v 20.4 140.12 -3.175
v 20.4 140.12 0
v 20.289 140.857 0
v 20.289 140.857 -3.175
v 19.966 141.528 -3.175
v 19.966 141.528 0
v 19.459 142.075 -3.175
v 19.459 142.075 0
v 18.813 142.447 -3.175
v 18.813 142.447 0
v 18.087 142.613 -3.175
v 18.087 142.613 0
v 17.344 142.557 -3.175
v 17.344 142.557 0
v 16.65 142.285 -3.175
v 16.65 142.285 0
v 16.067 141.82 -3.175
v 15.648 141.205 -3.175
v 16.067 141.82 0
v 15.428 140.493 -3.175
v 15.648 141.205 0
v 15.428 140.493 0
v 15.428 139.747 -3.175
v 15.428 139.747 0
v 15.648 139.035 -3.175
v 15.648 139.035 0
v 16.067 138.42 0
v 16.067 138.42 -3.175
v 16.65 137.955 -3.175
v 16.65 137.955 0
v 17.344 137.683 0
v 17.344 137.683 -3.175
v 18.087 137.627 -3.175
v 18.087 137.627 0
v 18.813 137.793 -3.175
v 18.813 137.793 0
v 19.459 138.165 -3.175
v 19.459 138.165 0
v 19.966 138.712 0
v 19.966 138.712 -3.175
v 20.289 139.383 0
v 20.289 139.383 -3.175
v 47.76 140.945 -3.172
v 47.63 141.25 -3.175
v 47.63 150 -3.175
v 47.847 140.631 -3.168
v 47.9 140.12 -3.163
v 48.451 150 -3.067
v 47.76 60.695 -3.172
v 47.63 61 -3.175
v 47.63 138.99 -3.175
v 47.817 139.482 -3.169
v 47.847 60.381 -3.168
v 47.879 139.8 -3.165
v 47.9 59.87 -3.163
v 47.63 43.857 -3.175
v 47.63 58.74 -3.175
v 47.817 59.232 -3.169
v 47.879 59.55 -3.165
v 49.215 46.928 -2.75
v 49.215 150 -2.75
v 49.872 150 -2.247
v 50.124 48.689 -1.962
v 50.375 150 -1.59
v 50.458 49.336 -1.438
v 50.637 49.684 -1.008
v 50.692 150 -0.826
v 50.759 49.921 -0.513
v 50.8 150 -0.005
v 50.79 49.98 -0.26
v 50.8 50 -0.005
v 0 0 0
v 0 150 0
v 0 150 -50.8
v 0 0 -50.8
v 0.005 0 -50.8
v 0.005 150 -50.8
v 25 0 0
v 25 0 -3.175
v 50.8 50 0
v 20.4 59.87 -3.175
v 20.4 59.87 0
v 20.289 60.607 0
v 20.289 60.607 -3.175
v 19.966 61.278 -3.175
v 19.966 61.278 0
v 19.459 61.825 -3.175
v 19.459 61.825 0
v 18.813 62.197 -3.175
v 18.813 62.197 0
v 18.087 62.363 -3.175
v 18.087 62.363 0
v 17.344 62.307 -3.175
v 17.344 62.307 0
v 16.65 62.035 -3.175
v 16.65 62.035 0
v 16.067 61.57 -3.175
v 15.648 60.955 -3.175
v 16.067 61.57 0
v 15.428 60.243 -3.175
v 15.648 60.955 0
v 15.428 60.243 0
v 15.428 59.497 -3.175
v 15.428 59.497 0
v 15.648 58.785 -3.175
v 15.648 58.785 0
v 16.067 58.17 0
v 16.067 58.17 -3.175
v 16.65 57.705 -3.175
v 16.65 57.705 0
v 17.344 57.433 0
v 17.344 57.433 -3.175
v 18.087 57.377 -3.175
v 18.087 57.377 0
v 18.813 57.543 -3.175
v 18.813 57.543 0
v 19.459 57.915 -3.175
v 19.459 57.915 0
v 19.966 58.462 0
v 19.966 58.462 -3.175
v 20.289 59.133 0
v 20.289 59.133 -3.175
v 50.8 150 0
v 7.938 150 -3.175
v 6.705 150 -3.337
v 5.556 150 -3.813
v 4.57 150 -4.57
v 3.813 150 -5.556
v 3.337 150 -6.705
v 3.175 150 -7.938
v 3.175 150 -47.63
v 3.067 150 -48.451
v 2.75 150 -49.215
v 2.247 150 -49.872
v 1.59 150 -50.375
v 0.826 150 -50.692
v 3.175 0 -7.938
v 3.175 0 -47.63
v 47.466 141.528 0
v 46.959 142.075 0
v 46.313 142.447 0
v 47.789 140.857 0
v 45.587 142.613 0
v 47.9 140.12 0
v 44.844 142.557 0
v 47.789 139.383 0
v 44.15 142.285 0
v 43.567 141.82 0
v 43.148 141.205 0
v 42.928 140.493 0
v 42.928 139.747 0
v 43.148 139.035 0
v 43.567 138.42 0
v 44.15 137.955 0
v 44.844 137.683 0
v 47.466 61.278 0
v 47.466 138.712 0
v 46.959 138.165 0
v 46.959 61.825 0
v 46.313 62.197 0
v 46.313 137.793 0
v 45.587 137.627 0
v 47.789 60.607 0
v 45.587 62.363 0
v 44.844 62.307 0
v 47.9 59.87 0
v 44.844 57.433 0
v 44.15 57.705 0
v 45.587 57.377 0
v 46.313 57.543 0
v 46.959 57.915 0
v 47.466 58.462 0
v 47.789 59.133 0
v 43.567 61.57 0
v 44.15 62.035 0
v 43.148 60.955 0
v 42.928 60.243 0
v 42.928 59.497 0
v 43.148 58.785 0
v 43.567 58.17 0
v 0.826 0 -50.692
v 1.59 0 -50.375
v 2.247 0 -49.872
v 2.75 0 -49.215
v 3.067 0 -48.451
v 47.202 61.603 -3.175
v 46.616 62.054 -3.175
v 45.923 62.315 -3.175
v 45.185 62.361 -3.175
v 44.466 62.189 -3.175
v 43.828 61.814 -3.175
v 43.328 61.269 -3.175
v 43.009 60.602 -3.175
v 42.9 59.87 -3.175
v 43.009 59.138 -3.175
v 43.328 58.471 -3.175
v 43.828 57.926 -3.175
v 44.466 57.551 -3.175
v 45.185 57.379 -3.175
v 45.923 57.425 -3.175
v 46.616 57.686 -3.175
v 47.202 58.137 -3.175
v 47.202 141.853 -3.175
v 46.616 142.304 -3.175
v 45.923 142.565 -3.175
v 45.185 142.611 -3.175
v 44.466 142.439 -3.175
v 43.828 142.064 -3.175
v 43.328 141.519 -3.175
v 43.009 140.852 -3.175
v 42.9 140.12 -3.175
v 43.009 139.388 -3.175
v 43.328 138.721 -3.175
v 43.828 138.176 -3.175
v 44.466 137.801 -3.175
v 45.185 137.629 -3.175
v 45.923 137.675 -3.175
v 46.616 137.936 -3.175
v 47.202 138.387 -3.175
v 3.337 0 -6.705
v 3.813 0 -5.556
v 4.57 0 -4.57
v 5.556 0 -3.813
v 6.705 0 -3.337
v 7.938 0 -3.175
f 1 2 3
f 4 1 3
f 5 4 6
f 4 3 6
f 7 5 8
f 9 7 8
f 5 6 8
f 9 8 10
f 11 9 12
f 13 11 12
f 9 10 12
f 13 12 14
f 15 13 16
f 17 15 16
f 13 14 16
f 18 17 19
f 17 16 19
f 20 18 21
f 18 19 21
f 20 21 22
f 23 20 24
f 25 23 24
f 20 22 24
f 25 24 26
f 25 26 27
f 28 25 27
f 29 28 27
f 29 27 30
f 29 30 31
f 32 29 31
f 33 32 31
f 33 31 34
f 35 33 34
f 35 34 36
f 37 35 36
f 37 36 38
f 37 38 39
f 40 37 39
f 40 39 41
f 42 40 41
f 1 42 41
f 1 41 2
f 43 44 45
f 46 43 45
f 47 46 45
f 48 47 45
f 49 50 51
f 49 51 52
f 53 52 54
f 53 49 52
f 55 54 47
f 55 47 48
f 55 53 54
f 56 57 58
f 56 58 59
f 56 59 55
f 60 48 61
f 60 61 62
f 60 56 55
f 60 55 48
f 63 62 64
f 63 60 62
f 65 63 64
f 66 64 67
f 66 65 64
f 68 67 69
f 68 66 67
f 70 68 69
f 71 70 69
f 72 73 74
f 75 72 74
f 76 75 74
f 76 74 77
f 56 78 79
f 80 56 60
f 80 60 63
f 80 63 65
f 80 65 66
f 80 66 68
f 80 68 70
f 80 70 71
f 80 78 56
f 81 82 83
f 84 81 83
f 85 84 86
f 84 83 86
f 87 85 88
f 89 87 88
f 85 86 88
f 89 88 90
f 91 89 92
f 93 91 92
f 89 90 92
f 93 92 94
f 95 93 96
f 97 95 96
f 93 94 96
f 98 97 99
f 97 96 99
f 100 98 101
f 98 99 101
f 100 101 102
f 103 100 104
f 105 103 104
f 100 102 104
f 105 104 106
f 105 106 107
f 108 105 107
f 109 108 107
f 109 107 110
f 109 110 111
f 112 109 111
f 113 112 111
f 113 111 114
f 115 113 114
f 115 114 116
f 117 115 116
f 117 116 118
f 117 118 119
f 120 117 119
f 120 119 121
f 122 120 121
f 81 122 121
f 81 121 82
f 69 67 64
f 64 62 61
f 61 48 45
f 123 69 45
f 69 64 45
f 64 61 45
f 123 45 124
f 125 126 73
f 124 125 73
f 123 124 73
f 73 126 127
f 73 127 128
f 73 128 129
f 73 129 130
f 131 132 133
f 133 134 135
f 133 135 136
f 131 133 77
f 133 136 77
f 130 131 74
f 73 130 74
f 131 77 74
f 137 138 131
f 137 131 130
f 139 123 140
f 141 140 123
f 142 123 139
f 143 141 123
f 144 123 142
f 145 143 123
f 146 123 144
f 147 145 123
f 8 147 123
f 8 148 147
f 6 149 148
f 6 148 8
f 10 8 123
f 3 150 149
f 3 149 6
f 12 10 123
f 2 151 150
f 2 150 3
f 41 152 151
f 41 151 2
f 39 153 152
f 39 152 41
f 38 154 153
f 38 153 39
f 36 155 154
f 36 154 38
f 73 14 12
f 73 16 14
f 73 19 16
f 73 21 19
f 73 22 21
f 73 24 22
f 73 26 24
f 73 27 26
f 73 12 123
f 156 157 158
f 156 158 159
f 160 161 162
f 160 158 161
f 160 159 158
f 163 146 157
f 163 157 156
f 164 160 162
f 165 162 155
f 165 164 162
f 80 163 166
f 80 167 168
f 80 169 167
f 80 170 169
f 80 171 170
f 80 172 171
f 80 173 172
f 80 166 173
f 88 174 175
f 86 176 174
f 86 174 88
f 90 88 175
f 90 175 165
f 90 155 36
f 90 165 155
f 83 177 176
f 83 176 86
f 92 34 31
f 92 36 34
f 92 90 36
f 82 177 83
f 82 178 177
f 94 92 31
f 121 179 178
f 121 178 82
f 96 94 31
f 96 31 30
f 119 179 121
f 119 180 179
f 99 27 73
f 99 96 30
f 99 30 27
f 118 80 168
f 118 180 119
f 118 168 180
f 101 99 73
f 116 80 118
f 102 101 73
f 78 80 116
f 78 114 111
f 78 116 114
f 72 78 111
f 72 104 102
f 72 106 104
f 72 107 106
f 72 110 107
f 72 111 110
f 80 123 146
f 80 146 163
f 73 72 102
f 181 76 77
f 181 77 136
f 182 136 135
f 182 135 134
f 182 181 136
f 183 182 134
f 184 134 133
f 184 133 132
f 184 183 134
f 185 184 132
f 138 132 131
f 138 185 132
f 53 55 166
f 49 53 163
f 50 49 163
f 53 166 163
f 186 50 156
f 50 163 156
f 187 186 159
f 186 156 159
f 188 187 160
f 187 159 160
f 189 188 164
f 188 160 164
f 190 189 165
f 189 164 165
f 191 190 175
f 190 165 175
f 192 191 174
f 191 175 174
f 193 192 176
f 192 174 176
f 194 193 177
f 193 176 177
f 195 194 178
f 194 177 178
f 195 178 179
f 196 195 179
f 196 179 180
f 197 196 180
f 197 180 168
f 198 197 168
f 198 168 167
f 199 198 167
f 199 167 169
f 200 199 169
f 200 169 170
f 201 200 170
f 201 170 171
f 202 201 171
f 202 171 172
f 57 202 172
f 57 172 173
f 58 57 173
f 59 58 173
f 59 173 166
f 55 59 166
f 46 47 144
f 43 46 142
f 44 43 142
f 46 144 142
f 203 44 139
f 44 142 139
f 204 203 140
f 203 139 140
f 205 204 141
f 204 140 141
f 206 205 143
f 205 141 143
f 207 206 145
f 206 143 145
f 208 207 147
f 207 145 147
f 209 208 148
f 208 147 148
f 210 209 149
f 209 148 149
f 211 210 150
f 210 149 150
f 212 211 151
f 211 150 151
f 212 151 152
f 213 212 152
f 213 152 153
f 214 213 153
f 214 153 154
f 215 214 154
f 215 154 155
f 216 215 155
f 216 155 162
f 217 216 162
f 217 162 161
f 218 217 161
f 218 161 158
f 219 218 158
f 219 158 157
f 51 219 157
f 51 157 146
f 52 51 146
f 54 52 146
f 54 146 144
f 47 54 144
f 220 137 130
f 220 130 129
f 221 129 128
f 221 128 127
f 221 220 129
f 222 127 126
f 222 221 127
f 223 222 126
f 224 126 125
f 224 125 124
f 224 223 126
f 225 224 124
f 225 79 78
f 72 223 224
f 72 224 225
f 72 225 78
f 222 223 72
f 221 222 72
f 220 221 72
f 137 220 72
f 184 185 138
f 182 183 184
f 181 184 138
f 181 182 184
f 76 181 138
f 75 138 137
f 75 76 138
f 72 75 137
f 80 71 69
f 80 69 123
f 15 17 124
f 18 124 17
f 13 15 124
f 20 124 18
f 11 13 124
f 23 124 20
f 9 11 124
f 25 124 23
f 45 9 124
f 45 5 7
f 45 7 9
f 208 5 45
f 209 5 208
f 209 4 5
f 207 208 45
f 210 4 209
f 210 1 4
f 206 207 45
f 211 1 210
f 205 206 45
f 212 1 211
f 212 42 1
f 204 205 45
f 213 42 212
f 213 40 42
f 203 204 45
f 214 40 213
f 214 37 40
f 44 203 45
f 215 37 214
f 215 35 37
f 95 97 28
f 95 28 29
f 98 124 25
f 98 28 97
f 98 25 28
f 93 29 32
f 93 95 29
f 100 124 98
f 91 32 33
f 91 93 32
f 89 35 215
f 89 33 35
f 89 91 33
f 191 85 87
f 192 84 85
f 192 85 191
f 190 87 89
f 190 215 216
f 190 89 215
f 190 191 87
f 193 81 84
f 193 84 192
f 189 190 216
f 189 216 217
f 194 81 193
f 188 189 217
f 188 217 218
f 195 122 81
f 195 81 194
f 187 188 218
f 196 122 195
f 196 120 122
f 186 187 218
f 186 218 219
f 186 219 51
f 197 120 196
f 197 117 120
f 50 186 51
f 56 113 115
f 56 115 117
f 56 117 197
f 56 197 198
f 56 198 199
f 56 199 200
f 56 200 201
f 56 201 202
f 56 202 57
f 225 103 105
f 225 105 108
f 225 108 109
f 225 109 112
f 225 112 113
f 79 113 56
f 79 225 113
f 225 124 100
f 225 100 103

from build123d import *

# Parameters (mm, degrees)
HIERRO_ANGULAR_2_X_2_X_0_125_1_DEPTH = 150
CORTAR_EXTRUIR1_DEPTH                = 10
CORTAR_EXTRUIR2_REACH                = 168.317
CROQUIS4_R                           = 2.5


with BuildPart() as part:
    # Sketch1 → Hierro angular 2 X 2 X 0.125(1) (new body)
    with BuildSketch(Plane(origin=(0, 0, 0), x_dir=(1, 0, 0), z_dir=(0, 1, 0))):
        with BuildLine():
            Line((0, 0), (0, 50.8))
            Line((0, 50.8), (0.00508, 50.8))
            ThreePointArc((0.00508, 50.8), (2.246551928, 49.871551928), (3.175, 47.63008))
            Line((3.175, 47.63008), (3.175, 7.9375))
            ThreePointArc((3.175, 7.9375), (4.569903955, 4.569903955), (7.9375, 3.175))
            Line((7.9375, 3.175), (47.63008, 3.175))
            ThreePointArc((47.63008, 3.175), (49.871551928, 2.246551928), (50.8, 0.00508))
            Line((50.8, 0.00508), (50.8, 0))
            Line((50.8, 0), (0, 0))
        make_face()
    extrude(amount=HIERRO_ANGULAR_2_X_2_X_0_125_1_DEPTH)

    # Croquis3 → Cortar-Extruir1 (cut)
    with BuildSketch(Plane.XY):
        Polygon((25, 0), (50.8, 50), (50.8, 0), align=None)
    extrude(amount=-CORTAR_EXTRUIR1_DEPTH, mode=Mode.SUBTRACT)

    # Cortar-Extruir2: up to this face of the body (flat: up to its plane)
    cortar_extruir2_end = Plane(part.part.faces().sort_by_distance((26.665136317, 80.490198143, -3.175))[0])
    # Croquis4 → Cortar-Extruir2 (cut, up to the picked face)
    with BuildSketch(Plane.XY, mode=Mode.PRIVATE) as cortar_extruir2_sk1:
        with Locations((17.9, 140.12)):
            Circle(CROQUIS4_R)
    cortar_extruir2_tool1 = split(extrude(cortar_extruir2_sk1.sketch, amount=-CORTAR_EXTRUIR2_REACH, mode=Mode.PRIVATE), bisect_by=cortar_extruir2_end, keep=Keep.BOTH, mode=Mode.PRIVATE)
    # Croquis4 → Cortar-Extruir2 (cut, up to the picked face)
    with BuildSketch(Plane.XY, mode=Mode.PRIVATE) as cortar_extruir2_sk2:
        with Locations((45.4, 140.12)):
            Circle(CROQUIS4_R)
    cortar_extruir2_tool2 = split(extrude(cortar_extruir2_sk2.sketch, amount=-CORTAR_EXTRUIR2_REACH, mode=Mode.PRIVATE), bisect_by=cortar_extruir2_end, keep=Keep.BOTH, mode=Mode.PRIVATE)
    # Croquis4 → Cortar-Extruir2 (cut, up to the picked face)
    with BuildSketch(Plane.XY, mode=Mode.PRIVATE) as cortar_extruir2_sk3:
        with Locations((17.9, 59.87)):
            Circle(CROQUIS4_R)
    cortar_extruir2_tool3 = split(extrude(cortar_extruir2_sk3.sketch, amount=-CORTAR_EXTRUIR2_REACH, mode=Mode.PRIVATE), bisect_by=cortar_extruir2_end, keep=Keep.BOTH, mode=Mode.PRIVATE)
    # Croquis4 → Cortar-Extruir2 (cut, up to the picked face)
    with BuildSketch(Plane.XY, mode=Mode.PRIVATE) as cortar_extruir2_sk4:
        with Locations((45.4, 59.87)):
            Circle(CROQUIS4_R)
    cortar_extruir2_tool4 = split(extrude(cortar_extruir2_sk4.sketch, amount=-CORTAR_EXTRUIR2_REACH, mode=Mode.PRIVATE), bisect_by=cortar_extruir2_end, keep=Keep.BOTH, mode=Mode.PRIVATE)
    add(cortar_extruir2_tool1.solids().sort_by(Axis((17.9, 140.12, 0), (0, 0, -1)))[0], mode=Mode.SUBTRACT)
    add(cortar_extruir2_tool2.solids().sort_by(Axis((45.4, 140.12, 0), (0, 0, -1)))[0], mode=Mode.SUBTRACT)
    add(cortar_extruir2_tool3.solids().sort_by(Axis((17.9, 59.87, 0), (0, 0, -1)))[0], mode=Mode.SUBTRACT)
    add(cortar_extruir2_tool4.solids().sort_by(Axis((45.4, 59.87, 0), (0, 0, -1)))[0], mode=Mode.SUBTRACT)


solid = part.part
